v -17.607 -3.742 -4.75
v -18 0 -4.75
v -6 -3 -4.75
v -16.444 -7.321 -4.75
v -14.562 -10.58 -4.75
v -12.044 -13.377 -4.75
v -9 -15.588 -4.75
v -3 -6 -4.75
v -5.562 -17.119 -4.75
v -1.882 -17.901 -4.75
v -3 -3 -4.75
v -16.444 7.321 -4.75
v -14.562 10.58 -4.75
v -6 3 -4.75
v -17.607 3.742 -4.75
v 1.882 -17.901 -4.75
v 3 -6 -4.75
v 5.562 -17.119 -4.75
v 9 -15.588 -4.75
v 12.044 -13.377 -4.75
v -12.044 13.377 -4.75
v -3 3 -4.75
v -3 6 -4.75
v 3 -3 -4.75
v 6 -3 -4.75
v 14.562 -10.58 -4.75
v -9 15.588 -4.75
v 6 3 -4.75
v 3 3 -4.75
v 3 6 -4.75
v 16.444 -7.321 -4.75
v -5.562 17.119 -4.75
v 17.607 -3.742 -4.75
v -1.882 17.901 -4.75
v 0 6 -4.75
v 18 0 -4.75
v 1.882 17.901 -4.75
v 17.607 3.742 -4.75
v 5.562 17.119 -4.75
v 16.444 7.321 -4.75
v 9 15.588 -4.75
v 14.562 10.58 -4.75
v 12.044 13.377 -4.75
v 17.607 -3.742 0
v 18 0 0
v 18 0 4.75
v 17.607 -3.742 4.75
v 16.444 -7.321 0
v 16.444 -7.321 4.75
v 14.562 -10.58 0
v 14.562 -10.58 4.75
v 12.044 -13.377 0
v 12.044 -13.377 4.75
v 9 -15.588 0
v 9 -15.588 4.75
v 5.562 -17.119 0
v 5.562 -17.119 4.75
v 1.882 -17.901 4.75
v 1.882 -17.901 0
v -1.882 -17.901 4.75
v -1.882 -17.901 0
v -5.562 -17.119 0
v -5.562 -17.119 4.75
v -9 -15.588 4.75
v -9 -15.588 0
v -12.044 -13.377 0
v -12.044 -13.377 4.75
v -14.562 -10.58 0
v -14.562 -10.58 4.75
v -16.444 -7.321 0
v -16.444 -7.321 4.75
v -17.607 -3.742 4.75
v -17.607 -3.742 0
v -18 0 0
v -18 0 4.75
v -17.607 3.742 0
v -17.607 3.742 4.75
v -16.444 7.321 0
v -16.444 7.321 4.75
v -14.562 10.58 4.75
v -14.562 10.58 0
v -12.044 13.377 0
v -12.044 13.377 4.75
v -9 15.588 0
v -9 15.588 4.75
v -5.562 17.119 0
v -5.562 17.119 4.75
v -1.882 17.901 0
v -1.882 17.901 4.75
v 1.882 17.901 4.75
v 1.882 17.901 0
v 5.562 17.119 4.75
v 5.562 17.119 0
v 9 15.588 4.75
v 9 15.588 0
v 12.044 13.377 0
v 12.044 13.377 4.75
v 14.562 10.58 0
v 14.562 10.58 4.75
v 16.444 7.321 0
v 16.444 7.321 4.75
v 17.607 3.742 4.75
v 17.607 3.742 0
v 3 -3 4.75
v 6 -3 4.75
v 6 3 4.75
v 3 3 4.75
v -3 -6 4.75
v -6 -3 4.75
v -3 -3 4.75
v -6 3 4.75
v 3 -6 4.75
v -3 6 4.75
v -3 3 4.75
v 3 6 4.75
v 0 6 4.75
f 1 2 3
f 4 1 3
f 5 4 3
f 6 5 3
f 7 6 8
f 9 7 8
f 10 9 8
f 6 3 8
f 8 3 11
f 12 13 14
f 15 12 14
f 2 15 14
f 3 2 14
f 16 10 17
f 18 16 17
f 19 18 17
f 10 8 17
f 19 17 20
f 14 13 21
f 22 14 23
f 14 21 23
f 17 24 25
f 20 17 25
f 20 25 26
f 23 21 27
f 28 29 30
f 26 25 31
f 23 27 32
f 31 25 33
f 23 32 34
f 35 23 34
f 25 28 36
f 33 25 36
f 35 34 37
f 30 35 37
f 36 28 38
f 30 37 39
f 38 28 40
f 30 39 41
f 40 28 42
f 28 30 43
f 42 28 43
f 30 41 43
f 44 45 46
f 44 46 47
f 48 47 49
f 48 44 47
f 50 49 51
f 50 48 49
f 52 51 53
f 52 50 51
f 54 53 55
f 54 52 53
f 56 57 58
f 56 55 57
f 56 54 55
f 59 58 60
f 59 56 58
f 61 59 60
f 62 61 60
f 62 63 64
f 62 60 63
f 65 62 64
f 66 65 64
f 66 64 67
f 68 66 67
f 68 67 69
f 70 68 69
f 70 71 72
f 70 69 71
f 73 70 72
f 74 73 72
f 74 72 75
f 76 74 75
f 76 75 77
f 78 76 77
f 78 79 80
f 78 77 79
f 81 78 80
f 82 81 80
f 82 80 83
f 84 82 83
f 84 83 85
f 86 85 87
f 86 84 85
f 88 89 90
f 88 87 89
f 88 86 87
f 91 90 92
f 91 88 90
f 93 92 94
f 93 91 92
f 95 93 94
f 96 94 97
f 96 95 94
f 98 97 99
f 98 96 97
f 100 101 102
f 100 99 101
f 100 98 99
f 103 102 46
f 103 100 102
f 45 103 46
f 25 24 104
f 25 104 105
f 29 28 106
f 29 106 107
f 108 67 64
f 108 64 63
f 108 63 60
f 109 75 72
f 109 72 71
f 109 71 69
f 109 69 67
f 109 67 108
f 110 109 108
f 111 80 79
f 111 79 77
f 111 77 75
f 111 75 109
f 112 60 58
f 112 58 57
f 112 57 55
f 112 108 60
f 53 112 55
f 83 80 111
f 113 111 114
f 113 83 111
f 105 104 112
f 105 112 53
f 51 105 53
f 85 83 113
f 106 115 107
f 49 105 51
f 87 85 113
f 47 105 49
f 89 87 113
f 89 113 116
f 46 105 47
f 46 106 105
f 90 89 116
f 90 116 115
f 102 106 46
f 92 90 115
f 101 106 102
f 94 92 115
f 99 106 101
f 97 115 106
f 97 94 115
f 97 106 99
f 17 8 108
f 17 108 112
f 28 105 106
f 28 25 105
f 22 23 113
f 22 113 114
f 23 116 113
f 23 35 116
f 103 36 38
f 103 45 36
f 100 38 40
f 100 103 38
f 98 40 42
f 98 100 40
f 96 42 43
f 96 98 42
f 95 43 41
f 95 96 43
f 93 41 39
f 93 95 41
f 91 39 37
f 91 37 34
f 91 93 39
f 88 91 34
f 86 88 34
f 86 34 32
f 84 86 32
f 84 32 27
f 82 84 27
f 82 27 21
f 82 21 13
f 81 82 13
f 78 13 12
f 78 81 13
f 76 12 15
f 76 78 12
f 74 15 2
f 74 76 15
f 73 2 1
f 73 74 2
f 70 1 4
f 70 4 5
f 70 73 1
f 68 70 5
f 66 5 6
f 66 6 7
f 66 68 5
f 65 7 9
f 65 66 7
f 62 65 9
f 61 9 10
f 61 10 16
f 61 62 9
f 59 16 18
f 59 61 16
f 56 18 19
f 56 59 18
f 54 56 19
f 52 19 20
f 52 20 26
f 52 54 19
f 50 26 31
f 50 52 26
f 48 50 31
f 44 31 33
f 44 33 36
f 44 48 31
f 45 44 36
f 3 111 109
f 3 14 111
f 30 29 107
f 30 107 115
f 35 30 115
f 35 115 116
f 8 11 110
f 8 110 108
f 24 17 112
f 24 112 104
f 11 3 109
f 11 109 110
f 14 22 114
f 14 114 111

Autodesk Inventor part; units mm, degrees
ref_plane "YZ Plane" through (0, 0, 0) normal (1, 0, 0) x (0, 1, 0)
ref_plane "XZ Plane" through (0, 0, 0) normal (0, 1, 0) x (-1, 0, 0)
ref_plane "XY Plane" through (0, 0, 0) normal (0, 0, 1) x (1, 0, 0)
sketch "Sketch1" plane through (0, 0, 0) normal (0, 0, 1) x (1, 0, 0)
  circle A0 centre (0, 0) radius 18
  dimension "d0" = 36
extrude "Extrusion1" add sketch "Sketch1" along normal mid plane 9.5
sketch "Sketch2" plane through (0, 0, -4.75) normal (0, 0, -1) x (-1, 0, 0)
  line L0 (0, 0) -> (0, 6)
  line L1 (0, 6) -> (3, 6)
  line L2 (3, 6) -> (3, 3)
  line L3 (3, 3) -> (6, 3)
  line L4 (6, 3) -> (6, -3)
  line L5 (6, -3) -> (3, -3)
  line L6 (3, -3) -> (3, -6)
  line L7 (3, -6) -> (-3, -6)
  line L8 (-3, -6) -> (-3, -3)
  line L9 (-3, -3) -> (-6, -3)
  line L10 (-6, -3) -> (-6, 3)
  line L11 (-6, 3) -> (-3, 3)
  line L12 (-3, 3) -> (-3, 6)
  line L13 (-3, 6) -> (0, 6)
  dimension "d46" = 6
  dimension "d47" = 3
  dimension "d48" = 3
  dimension "d49" = 3
  dimension "d50" = 6
  dimension "d51" = 3
  dimension "d52" = 3
  dimension "d53" = 6
  dimension "d55" = 3
  dimension "d56" = 3
  dimension "d57" = 6
  dimension "d59" = 3
  dimension "d60" = 3
extrude "Extrusion2" cut sketch "Sketch2" against normal blind 11
properties part number "OmniShaft"
